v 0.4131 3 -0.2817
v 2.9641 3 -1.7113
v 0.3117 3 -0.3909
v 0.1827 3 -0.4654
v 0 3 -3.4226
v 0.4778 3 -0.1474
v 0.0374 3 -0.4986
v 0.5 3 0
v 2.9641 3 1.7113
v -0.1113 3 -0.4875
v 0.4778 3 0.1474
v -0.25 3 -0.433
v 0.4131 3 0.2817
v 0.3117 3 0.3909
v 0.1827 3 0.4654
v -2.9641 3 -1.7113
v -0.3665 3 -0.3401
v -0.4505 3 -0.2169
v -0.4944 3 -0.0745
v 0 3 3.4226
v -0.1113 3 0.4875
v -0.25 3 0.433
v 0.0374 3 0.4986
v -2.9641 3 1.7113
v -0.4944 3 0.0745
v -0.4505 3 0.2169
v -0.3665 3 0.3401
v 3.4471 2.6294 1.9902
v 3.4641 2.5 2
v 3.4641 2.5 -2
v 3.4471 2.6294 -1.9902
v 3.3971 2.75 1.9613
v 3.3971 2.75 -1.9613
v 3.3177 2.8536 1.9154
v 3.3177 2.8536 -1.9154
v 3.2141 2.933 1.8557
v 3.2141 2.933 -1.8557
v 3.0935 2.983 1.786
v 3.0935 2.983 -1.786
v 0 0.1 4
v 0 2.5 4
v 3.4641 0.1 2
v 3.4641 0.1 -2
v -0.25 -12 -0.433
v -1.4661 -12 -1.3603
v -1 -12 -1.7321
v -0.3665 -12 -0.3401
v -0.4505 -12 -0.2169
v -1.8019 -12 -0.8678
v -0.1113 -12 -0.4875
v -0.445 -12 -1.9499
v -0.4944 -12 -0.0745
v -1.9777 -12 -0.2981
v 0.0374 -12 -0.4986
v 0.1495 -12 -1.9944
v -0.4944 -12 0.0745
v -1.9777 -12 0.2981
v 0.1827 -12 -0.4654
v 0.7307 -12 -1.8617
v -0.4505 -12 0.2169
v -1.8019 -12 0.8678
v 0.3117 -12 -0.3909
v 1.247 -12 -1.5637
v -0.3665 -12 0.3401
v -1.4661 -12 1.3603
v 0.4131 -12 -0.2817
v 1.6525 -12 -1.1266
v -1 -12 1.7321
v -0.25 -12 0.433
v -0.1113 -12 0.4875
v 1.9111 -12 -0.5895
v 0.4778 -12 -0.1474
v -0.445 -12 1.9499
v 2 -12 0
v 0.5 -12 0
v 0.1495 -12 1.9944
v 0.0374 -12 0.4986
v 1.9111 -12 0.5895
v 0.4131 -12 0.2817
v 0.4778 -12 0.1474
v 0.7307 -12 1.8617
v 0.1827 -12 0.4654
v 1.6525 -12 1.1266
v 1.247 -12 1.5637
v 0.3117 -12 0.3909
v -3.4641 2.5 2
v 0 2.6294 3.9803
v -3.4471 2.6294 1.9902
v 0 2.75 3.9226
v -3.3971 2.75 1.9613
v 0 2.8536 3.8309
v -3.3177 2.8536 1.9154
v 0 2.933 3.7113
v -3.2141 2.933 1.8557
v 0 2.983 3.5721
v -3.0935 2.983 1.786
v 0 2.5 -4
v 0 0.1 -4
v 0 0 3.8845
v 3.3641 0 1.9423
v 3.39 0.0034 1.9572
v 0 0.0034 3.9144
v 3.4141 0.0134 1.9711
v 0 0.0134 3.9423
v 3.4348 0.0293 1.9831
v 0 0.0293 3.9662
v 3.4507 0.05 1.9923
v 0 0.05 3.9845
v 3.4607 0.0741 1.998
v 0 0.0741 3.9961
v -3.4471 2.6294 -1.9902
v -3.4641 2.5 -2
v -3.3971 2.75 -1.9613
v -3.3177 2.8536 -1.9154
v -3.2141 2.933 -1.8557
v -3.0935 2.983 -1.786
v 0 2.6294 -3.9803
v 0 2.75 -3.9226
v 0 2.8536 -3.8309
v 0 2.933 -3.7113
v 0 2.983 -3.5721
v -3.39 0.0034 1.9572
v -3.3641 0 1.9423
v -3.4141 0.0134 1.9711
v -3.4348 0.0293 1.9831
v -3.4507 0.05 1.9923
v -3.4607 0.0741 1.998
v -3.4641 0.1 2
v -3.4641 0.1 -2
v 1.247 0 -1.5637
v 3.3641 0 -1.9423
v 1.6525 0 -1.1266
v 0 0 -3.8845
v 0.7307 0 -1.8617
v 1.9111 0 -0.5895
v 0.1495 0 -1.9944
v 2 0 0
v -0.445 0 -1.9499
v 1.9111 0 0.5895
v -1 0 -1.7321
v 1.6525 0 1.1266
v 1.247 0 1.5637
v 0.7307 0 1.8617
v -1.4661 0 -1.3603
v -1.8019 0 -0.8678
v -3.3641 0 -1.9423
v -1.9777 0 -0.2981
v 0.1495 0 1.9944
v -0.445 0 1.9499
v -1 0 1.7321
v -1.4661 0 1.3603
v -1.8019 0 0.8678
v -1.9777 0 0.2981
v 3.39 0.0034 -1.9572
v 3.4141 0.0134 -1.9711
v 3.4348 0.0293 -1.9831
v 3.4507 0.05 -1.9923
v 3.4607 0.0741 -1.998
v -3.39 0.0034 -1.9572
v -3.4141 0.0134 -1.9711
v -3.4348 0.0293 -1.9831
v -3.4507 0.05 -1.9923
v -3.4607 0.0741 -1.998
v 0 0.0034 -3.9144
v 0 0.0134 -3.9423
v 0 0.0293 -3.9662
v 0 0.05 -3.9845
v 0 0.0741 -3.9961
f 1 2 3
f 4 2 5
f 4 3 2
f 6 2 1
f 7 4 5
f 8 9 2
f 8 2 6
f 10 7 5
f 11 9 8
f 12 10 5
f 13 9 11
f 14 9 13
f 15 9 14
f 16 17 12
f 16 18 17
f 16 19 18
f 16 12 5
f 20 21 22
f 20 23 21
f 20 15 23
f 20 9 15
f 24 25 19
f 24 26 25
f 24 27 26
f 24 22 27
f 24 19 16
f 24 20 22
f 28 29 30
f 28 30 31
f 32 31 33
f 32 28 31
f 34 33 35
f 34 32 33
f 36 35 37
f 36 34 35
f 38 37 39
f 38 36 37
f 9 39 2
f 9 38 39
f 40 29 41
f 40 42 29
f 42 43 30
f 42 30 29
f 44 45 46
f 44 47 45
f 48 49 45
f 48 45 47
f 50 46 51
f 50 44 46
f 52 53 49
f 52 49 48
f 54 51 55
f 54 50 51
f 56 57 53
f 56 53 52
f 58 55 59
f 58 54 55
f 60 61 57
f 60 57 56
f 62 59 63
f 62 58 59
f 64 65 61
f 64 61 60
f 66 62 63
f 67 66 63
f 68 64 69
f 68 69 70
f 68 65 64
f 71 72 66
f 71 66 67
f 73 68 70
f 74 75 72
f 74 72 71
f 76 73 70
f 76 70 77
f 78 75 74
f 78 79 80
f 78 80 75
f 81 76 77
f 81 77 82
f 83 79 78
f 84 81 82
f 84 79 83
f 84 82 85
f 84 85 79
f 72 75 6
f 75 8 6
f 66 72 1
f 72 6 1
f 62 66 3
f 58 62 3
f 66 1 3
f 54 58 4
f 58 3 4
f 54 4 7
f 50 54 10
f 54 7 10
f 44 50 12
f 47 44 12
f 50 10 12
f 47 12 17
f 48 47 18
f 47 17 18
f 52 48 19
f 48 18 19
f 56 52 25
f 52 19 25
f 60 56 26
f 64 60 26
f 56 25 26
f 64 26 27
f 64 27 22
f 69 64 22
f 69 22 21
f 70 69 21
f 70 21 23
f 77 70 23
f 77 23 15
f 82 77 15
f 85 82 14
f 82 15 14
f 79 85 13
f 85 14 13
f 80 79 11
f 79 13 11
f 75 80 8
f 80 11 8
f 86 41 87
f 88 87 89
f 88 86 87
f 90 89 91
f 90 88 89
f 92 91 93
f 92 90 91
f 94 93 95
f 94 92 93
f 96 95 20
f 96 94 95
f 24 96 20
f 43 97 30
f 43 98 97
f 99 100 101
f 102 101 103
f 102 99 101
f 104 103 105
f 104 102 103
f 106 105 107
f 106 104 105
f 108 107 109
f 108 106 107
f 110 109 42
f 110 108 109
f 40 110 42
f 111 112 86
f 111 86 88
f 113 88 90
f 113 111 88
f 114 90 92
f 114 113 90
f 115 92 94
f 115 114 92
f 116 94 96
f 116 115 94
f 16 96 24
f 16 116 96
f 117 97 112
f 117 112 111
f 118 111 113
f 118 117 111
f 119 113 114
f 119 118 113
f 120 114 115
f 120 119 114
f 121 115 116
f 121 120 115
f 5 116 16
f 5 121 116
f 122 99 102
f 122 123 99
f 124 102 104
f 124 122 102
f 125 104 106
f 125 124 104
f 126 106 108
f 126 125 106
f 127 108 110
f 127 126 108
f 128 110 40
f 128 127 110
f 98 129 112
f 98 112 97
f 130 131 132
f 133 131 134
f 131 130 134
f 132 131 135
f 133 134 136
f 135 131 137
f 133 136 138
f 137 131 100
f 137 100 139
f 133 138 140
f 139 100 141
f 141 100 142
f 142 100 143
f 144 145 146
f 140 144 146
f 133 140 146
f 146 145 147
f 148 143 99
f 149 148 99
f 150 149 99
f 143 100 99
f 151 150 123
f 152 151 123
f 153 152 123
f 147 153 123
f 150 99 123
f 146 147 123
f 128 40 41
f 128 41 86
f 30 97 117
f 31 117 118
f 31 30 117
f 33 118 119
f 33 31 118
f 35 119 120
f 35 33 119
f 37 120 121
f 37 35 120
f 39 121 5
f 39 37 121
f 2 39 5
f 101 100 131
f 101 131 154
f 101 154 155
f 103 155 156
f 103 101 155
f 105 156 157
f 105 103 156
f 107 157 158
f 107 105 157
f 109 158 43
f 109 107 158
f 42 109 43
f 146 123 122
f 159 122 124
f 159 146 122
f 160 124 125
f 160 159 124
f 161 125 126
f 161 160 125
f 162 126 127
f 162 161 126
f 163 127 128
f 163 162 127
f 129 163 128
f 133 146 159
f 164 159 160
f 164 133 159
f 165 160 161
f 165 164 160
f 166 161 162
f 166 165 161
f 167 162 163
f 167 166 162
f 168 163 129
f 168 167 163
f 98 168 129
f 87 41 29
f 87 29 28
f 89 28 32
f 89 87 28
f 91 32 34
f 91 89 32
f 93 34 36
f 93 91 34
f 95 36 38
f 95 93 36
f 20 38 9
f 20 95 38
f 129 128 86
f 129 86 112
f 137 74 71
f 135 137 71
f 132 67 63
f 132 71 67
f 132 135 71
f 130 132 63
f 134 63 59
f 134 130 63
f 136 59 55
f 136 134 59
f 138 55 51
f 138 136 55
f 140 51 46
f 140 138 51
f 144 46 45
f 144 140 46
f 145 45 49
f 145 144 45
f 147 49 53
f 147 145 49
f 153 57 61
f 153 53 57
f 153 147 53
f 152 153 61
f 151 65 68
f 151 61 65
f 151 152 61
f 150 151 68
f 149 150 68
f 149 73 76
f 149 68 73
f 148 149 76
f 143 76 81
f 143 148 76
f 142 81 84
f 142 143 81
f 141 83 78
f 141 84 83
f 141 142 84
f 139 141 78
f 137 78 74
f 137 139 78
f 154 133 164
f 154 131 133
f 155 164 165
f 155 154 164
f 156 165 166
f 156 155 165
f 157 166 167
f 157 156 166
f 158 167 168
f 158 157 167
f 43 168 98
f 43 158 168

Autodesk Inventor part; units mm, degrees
ref_plane "YZ Plane" through (0, 0, 0) normal (1, 0, 0) x (0, 1, 0)
ref_plane "XZ Plane" through (0, 0, 0) normal (0, 1, 0) x (-1, 0, 0)
ref_plane "XY Plane" through (0, 0, 0) normal (0, 0, 1) x (1, 0, 0)
sketch "スケッチ1" plane through (0, 0, 0) normal (0, 1, 0) x (-1, 0, 0)
  circle A0 centre (0, 0) radius 4 construction
  line L0 (0, 0) -> (0, -4.9846) construction
  line L1 (0, 0) -> (4.0815, -2.3565) construction
  line L2 (3.4641, -2) -> (0, -4)
  line L3 (3.4641, 2) -> (3.4641, -2)
  line L4 (0, 4) -> (3.4641, 2)
  line L5 (-3.4641, 2) -> (0, 4)
  line L6 (-3.4641, -2) -> (-3.4641, 2)
  line L7 (0, -4) -> (-3.4641, -2)
  dimension "d0" = 8
  dimension "d1" = 60
  dimension "d4" = 360
extrude "押し出し1" add sketch "スケッチ1" along normal blind 3
fillet "フィレット1" radius 0.5 6 edges at (1.7321, 3, 3) (-1.7321, 3, 3) (-3.4641, 3, 0) (-1.7321, 3, -3) (1.7321, 3, -3) (3.4641, 3, 0)
fillet "フィレット2" radius 0.1 6 edges at (1.7321, 0, 3) (-1.7321, 0, 3) (-3.4641, 0, 0) (-1.7321, 0, -3) (1.7321, 0, -3) (3.4641, 0, 0)
sketch "スケッチ2" plane through (0, 0, 0) normal (0, -1, 0) x (1, 0, 0)
  circle A0 centre (0, 0) radius 2
  dimension "d10" = 4
extrude "押し出し2" add sketch "スケッチ2" along normal blind 12
thread "ねじ1" size "M4x0.7" class "6g" standard "ANSI Metric M Profile" full length
sketch "スケッチ3" plane through (0, 3, 0) normal (0, 1, 0) x (1, 0, 0)
  circle A0 centre (0, 0) radius 0.5
  dimension "d15" = 1
extrude "押し出し3" cut sketch "スケッチ3" against normal through all
properties part number "M4×12-VentedHexBolt" material "ステンレス鋼"
